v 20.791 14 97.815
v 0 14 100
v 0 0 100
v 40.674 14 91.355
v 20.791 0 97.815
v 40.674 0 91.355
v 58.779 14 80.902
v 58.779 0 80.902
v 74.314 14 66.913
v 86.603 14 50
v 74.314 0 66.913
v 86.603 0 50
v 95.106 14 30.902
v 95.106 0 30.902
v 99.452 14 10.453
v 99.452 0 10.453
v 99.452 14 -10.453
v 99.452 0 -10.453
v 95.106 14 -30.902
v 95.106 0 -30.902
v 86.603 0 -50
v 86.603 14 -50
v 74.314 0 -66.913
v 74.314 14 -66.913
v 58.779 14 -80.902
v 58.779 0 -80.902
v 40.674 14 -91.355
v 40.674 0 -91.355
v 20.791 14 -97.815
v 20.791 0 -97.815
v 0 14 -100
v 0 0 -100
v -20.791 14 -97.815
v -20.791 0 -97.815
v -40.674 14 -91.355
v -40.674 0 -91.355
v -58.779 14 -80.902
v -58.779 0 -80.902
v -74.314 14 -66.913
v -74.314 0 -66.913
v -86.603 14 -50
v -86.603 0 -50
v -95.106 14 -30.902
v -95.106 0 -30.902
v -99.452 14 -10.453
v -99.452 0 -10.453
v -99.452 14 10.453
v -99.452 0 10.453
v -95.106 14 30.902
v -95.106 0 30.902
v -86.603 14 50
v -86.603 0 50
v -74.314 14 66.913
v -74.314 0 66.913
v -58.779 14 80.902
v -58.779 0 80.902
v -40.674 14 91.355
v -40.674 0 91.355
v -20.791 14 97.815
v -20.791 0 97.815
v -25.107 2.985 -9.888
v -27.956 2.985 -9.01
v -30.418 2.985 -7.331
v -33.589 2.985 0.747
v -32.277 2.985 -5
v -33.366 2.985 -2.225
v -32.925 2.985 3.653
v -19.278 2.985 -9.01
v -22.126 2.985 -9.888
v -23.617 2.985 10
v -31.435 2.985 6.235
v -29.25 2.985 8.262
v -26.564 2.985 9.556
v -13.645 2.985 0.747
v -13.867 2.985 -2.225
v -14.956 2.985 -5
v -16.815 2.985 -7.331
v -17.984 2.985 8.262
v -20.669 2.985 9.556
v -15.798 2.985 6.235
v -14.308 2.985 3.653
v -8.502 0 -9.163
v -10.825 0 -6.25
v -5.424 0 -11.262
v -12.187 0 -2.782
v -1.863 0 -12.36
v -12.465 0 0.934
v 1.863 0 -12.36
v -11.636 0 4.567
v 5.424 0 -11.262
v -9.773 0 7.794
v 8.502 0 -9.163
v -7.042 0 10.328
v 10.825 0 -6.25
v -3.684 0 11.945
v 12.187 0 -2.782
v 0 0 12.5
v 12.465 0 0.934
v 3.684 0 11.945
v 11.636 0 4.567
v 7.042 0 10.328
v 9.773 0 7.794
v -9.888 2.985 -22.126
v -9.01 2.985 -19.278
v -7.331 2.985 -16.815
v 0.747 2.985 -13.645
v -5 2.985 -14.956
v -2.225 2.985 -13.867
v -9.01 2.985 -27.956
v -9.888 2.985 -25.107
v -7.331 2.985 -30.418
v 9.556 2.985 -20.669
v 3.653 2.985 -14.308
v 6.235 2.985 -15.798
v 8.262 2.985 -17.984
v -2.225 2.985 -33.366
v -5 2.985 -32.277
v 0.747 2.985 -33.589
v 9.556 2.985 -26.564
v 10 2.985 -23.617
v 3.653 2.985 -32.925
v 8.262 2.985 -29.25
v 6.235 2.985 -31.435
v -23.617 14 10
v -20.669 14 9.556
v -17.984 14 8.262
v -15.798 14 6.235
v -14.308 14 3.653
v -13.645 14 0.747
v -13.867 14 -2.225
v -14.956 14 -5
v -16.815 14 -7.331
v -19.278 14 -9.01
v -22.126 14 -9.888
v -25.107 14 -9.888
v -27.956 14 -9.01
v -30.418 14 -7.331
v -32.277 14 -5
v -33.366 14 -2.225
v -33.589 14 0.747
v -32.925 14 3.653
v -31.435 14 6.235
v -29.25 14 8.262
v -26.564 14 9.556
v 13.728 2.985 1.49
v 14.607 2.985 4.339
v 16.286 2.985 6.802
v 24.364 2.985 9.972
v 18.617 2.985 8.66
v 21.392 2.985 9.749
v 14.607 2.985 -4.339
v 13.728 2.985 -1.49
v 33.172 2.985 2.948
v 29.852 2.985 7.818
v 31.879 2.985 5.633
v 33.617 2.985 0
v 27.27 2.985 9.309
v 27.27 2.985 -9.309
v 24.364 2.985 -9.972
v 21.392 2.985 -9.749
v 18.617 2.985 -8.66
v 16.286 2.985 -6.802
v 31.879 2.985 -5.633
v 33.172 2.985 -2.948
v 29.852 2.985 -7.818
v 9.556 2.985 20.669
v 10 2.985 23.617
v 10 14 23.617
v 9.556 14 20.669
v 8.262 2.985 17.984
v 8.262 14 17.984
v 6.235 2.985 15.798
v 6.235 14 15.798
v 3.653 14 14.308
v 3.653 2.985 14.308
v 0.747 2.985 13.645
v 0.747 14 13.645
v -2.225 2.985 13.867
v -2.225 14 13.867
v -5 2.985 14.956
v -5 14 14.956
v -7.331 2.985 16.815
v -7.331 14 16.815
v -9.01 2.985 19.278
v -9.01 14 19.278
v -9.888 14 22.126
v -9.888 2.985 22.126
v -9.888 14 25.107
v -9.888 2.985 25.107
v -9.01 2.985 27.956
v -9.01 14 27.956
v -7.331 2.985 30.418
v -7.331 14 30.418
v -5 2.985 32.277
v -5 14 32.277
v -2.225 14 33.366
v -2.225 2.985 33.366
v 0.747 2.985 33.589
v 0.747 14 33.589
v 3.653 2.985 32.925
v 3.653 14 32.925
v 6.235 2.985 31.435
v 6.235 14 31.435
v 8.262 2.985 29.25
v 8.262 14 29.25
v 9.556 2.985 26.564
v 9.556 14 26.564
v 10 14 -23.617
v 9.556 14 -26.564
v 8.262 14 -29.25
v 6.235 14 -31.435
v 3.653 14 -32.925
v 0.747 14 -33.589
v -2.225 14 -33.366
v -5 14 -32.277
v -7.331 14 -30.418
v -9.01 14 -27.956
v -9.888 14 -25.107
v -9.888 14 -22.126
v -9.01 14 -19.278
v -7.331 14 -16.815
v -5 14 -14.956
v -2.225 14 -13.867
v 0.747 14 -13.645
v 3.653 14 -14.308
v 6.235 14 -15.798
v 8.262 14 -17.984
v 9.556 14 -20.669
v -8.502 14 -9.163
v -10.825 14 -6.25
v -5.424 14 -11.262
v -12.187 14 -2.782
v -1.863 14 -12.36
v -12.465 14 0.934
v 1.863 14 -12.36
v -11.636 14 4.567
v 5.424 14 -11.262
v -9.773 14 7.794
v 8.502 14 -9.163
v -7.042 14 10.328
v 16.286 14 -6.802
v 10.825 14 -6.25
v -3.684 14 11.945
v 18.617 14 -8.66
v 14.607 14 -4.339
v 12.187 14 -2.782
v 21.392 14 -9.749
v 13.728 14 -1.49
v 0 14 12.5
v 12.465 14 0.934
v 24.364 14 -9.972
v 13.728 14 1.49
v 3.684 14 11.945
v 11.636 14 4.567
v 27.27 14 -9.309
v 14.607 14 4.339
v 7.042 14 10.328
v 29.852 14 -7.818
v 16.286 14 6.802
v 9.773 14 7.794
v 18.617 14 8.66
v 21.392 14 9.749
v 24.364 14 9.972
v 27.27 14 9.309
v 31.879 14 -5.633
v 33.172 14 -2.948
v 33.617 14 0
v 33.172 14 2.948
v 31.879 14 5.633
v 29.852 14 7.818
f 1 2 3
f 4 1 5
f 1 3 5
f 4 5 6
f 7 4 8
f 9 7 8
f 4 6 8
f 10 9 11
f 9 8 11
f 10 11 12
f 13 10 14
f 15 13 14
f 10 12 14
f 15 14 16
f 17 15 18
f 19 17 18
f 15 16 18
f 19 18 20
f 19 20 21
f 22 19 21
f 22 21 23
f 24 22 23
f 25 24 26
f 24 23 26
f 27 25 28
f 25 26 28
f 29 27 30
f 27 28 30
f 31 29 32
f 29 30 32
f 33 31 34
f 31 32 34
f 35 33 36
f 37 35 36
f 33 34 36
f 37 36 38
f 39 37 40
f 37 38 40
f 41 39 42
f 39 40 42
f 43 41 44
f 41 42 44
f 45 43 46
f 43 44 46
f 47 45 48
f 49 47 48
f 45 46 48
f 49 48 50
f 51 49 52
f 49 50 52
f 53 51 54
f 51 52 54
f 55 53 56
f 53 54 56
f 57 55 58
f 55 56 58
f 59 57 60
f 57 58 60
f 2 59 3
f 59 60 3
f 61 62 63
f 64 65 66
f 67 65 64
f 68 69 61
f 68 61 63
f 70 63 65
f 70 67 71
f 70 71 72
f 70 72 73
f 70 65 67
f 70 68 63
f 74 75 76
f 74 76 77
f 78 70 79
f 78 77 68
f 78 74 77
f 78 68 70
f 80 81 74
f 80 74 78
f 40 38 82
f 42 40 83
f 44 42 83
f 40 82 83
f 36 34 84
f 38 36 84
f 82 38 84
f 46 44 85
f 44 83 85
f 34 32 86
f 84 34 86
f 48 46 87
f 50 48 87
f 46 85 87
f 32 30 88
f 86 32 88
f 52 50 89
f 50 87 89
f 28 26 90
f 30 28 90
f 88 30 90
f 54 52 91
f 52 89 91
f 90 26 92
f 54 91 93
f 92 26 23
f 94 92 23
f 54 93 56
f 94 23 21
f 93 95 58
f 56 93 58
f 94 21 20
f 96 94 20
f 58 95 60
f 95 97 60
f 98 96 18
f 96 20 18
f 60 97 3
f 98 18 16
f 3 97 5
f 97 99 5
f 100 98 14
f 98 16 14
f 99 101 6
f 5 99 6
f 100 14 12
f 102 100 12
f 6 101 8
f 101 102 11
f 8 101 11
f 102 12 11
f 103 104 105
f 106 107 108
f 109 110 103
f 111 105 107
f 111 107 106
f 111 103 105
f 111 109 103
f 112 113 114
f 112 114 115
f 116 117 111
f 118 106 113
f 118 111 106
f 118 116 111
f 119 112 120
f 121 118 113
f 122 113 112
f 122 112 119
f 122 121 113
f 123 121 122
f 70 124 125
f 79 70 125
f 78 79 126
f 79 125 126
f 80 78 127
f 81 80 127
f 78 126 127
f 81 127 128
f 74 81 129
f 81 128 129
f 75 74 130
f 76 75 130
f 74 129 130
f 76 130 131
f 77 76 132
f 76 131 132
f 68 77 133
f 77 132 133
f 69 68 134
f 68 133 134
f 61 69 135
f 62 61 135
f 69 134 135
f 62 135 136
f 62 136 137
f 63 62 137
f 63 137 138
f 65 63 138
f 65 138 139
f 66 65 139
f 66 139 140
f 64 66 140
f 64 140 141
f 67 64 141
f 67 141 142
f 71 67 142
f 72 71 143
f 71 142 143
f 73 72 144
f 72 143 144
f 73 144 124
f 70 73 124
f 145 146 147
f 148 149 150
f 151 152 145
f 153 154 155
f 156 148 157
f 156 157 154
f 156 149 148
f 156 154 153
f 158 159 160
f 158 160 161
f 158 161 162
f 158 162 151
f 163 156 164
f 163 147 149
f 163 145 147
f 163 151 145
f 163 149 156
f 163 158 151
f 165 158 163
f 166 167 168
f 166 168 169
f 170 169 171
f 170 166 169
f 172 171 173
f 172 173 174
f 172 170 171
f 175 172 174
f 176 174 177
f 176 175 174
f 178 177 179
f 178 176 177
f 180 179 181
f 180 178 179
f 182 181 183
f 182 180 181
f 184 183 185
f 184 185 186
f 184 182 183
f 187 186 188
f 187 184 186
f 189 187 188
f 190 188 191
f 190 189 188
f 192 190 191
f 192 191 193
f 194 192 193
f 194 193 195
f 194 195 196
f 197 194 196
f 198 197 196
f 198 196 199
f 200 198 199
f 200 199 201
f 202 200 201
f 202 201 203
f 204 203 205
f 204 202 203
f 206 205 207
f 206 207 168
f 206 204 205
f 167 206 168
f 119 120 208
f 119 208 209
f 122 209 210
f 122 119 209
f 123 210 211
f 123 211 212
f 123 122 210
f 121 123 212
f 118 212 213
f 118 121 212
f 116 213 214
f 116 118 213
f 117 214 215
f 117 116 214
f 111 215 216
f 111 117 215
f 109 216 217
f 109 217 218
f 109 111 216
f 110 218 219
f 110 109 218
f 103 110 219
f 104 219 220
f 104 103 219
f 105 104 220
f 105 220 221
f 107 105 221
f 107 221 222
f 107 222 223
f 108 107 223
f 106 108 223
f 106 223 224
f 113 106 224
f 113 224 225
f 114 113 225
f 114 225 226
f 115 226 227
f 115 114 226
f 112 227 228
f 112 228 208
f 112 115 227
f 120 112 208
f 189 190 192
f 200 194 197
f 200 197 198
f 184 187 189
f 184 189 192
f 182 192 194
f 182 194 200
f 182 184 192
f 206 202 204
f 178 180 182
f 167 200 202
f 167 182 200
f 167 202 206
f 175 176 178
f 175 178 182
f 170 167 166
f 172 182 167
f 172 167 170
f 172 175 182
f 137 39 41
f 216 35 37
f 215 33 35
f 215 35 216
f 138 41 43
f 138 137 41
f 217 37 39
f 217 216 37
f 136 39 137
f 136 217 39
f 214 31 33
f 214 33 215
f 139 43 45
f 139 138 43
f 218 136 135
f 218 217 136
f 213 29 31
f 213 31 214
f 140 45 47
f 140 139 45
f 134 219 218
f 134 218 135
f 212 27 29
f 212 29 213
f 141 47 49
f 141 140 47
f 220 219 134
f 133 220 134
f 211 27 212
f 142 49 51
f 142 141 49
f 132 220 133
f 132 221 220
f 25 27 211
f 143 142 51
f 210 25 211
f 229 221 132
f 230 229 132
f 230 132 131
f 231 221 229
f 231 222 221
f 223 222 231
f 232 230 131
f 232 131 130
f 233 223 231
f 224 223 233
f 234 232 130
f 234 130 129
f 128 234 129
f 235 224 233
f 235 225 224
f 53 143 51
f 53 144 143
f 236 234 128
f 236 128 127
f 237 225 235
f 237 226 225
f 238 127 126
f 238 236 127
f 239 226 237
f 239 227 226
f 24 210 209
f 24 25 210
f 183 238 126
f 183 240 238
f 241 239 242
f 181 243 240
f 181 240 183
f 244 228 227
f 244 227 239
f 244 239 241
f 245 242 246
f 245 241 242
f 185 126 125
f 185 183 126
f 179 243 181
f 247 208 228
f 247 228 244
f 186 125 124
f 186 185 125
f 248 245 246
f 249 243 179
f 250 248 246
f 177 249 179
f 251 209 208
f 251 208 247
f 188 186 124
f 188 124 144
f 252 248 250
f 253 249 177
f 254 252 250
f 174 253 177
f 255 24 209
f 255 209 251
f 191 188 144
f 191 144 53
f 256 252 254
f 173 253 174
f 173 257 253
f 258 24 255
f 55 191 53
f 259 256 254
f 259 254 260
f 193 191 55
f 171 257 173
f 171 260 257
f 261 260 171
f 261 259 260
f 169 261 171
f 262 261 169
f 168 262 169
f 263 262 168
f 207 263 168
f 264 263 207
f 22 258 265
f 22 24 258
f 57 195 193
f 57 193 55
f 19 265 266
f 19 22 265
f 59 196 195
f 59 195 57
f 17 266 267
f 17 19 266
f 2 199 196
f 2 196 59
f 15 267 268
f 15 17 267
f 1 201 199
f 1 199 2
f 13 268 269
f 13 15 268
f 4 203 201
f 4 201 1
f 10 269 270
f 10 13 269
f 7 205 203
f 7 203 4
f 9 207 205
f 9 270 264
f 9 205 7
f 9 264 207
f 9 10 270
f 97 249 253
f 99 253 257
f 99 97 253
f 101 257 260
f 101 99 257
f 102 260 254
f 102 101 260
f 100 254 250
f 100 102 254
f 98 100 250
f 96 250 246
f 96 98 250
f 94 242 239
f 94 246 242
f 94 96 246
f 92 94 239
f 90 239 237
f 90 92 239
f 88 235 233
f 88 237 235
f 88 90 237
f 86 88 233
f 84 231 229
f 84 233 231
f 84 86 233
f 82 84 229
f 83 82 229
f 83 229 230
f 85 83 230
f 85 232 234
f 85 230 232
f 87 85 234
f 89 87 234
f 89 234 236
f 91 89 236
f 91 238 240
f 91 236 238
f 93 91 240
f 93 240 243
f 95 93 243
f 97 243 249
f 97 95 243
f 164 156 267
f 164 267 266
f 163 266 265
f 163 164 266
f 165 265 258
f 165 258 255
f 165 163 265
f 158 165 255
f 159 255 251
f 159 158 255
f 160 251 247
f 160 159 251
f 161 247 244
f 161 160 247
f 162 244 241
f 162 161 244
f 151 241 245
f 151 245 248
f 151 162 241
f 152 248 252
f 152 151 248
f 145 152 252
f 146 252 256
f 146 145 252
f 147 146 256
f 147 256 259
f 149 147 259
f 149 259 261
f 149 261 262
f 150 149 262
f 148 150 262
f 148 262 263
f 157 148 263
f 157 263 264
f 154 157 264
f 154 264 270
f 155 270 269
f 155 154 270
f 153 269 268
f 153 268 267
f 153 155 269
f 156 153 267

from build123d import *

# Parameters (mm, degrees)
SKETCH1_R           = 100
BOSS_EXTRUDE1_DEPTH = 14
SKETCH2_R           = 12.5
CUT_EXTRUDE1_DEPTH  = 143.112631388
SKETCH3_R           = 10
CUT_EXTRUDE2_DEPTH  = 11.015412359
CIRPATTERN1_COUNT   = 4


with BuildPart() as part:
    # Sketch1 → Boss-Extrude1 (new body)
    with BuildSketch(Plane(origin=(0, 0, 0), x_dir=(1, 0, 0), z_dir=(0, 1, 0))):
        Circle(SKETCH1_R)
    extrude(amount=BOSS_EXTRUDE1_DEPTH)

    # Sketch2 → Cut-Extrude1 (cut, through all)
    with BuildSketch(Plane(origin=(0, 0, 0), x_dir=(1, 0, 0), z_dir=(0, 1, 0))):
        Circle(SKETCH2_R)
    extrude(amount=CUT_EXTRUDE1_DEPTH, mode=Mode.SUBTRACT)

    # Sketch3 → Cut-Extrude2 (cut)
    with BuildSketch(Plane(origin=(0, 14, 0), x_dir=(1, 0, 0), z_dir=(0, 1, 0))):
        with Locations((-23.616715223, 0)):
            Circle(SKETCH3_R)
    cut_extrude2 = extrude(amount=-CUT_EXTRUDE2_DEPTH, mode=Mode.SUBTRACT)

    # CirPattern1: Cut-Extrude2 ×4 about axis
    cirpattern1_axis = Axis((0, 0, 0), (0, 1, 0))
    for i in range(1, CIRPATTERN1_COUNT):
        add(cut_extrude2.rotate(cirpattern1_axis, i * 360 / CIRPATTERN1_COUNT), mode=Mode.SUBTRACT)


solid = part.part
